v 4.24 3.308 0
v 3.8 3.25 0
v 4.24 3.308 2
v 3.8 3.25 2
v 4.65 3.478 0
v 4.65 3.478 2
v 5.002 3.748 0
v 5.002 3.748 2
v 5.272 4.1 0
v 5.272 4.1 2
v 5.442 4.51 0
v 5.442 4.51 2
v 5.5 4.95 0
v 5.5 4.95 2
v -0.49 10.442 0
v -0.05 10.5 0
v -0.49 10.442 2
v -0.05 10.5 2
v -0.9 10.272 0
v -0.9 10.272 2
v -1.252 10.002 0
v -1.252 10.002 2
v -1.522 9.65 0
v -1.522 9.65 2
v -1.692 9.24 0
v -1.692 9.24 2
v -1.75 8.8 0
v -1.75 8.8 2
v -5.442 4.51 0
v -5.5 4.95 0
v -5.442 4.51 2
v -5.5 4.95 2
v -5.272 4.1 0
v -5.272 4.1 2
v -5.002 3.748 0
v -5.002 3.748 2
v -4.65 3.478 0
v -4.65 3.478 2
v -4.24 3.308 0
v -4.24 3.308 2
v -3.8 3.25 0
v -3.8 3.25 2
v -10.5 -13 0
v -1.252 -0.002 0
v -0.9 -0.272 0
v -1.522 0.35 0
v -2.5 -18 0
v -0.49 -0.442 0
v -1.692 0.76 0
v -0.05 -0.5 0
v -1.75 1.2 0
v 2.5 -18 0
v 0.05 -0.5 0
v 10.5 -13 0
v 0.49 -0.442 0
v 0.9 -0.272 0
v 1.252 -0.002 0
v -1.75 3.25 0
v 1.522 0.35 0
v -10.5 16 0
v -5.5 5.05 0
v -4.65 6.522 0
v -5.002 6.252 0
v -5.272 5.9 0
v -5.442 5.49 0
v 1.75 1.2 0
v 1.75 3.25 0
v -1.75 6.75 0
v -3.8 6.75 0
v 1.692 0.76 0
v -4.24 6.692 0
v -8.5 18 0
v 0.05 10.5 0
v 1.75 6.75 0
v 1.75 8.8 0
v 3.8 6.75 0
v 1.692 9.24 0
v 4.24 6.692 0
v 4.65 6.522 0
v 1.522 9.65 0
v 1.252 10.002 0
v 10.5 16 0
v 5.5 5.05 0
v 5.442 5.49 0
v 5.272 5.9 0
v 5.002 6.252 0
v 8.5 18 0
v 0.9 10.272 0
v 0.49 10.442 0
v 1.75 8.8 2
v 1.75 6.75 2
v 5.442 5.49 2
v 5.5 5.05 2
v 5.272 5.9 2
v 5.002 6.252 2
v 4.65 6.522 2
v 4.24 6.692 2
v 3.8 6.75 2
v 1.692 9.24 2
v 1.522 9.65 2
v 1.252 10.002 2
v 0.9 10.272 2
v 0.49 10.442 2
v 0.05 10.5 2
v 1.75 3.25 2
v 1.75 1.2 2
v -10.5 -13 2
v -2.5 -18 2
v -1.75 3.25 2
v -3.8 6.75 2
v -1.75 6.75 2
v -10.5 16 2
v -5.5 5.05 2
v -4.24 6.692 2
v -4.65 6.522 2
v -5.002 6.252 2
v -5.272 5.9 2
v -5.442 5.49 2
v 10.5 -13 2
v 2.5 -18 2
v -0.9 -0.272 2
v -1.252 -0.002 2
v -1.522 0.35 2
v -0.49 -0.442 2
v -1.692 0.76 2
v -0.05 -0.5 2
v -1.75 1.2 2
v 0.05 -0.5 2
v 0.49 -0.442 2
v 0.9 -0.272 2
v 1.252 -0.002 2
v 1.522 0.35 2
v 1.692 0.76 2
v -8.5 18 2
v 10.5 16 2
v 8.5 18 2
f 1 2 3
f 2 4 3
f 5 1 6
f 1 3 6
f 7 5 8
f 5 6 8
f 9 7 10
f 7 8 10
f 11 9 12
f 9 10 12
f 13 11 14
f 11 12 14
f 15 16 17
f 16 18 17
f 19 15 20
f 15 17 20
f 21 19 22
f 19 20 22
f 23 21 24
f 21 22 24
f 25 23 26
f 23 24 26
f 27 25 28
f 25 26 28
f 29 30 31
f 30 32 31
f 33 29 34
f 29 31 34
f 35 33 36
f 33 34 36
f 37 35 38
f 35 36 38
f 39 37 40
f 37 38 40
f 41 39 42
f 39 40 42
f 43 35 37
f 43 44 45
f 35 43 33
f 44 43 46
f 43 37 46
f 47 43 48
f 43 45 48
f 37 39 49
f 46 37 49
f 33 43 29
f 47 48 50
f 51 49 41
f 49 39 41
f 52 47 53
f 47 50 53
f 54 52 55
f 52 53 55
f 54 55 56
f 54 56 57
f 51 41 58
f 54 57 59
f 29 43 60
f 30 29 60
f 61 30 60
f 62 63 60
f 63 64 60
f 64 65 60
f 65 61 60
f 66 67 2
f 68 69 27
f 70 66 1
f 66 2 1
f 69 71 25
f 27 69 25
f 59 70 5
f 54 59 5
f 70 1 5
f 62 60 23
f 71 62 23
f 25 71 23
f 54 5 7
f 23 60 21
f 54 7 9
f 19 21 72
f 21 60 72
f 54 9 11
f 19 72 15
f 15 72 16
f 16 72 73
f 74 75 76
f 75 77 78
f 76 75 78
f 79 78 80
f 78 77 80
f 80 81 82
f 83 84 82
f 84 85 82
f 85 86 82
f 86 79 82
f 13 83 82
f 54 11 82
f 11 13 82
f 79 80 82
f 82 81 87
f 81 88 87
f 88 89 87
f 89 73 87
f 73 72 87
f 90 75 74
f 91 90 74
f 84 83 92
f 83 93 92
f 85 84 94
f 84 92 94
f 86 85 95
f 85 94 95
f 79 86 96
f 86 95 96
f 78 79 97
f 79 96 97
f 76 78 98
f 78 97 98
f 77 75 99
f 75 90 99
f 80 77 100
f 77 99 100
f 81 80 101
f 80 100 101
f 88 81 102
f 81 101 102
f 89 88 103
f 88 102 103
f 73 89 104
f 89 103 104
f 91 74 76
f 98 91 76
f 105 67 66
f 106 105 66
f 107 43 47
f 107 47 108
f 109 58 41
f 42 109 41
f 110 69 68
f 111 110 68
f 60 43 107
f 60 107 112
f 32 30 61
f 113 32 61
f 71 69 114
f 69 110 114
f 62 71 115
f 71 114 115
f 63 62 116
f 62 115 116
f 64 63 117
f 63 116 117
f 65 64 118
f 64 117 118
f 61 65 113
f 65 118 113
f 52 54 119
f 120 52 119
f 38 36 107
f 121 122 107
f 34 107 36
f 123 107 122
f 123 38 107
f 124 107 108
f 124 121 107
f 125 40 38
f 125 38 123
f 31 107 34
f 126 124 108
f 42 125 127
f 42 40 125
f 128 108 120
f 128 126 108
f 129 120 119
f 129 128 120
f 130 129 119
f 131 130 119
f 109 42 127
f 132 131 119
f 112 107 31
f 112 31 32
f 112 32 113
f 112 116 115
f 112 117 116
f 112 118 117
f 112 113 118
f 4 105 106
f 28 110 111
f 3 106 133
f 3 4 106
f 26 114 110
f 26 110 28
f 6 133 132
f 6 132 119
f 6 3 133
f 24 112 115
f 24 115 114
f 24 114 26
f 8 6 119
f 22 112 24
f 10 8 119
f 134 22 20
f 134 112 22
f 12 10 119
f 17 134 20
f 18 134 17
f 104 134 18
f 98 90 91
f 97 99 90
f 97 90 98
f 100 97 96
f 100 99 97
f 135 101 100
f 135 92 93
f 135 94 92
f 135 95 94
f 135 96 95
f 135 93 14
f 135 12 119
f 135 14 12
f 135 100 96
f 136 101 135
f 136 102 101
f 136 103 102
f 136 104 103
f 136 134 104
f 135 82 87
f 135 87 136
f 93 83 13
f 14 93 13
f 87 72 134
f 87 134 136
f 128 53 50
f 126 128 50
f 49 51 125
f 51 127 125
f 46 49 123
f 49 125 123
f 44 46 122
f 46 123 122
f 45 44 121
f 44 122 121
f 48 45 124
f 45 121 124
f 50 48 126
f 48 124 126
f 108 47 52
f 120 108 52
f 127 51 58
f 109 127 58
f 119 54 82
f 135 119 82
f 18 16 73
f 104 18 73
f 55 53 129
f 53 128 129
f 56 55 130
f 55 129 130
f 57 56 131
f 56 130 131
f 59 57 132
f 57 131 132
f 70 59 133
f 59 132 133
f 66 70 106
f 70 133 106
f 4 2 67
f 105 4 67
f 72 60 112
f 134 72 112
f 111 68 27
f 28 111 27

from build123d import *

# Parameters (mm, degrees)
F0_W       = 21
F0_H       = 36
F1_DEPTH   = 2
F2_SIZE    = 2
F3_SIZE2   = 8
F3_SIZE    = 5
F3_2_SIZE2 = 8
F3_2_SIZE  = 5
F4_R       = 1.7


with BuildPart() as f1:
    # F0 (on Top) → F1 (new body)
    with BuildSketch(Plane.XY):
        Rectangle(F0_W, F0_H)
        Polygon((1.75, 3.25), (1.75, -0.5), (-1.75, -0.5), (-1.75, 3.25), (-5.5, 3.25), (-5.5, 6.75), (-1.75, 6.75), (-1.75, 10.5), (1.75, 10.5), (1.75, 6.75), (5.5, 6.75), (5.5, 3.25), align=None, mode=Mode.SUBTRACT)
    extrude(amount=F1_DEPTH)

    # F2
    f2_edges = [f1.edges().sort_by_distance(p)[0] for p in [
        (10.5, 18, 1),
        (-10.5, 18, 1),
    ]]
    chamfer(f2_edges, length=F2_SIZE)

    # F3
    f3_edges = [f1.edges().sort_by_distance(p)[0] for p in [
        (10.5, -18, 1),
    ]]
    f3_side = f1.faces().sort_by_distance((10.5, -1, 1))[0]
    chamfer(f3_edges, length=F3_SIZE, length2=F3_SIZE2, reference=f3_side)

    # F3#2
    f3_2_edges = [f1.edges().sort_by_distance(p)[0] for p in [
        (-10.5, -18, 1),
    ]]
    f3_2_side = f1.faces().sort_by_distance((-10.5, -1, 1))[0]
    chamfer(f3_2_edges, length=F3_2_SIZE, length2=F3_2_SIZE2, reference=f3_2_side)

    # F4
    f4_edges = [f1.edges().sort_by_distance(p)[0] for p in [
        (5.5, 6.75, 1),
        (1.75, 10.5, 1),
        (-1.75, 10.5, 1),
        (-5.5, 6.75, 1),
        (-5.5, 3.25, 1),
        (-1.75, -0.5, 1),
        (1.75, -0.5, 1),
        (5.5, 3.25, 1),
    ]]
    fillet(f4_edges, radius=F4_R)


solid = f1.part
